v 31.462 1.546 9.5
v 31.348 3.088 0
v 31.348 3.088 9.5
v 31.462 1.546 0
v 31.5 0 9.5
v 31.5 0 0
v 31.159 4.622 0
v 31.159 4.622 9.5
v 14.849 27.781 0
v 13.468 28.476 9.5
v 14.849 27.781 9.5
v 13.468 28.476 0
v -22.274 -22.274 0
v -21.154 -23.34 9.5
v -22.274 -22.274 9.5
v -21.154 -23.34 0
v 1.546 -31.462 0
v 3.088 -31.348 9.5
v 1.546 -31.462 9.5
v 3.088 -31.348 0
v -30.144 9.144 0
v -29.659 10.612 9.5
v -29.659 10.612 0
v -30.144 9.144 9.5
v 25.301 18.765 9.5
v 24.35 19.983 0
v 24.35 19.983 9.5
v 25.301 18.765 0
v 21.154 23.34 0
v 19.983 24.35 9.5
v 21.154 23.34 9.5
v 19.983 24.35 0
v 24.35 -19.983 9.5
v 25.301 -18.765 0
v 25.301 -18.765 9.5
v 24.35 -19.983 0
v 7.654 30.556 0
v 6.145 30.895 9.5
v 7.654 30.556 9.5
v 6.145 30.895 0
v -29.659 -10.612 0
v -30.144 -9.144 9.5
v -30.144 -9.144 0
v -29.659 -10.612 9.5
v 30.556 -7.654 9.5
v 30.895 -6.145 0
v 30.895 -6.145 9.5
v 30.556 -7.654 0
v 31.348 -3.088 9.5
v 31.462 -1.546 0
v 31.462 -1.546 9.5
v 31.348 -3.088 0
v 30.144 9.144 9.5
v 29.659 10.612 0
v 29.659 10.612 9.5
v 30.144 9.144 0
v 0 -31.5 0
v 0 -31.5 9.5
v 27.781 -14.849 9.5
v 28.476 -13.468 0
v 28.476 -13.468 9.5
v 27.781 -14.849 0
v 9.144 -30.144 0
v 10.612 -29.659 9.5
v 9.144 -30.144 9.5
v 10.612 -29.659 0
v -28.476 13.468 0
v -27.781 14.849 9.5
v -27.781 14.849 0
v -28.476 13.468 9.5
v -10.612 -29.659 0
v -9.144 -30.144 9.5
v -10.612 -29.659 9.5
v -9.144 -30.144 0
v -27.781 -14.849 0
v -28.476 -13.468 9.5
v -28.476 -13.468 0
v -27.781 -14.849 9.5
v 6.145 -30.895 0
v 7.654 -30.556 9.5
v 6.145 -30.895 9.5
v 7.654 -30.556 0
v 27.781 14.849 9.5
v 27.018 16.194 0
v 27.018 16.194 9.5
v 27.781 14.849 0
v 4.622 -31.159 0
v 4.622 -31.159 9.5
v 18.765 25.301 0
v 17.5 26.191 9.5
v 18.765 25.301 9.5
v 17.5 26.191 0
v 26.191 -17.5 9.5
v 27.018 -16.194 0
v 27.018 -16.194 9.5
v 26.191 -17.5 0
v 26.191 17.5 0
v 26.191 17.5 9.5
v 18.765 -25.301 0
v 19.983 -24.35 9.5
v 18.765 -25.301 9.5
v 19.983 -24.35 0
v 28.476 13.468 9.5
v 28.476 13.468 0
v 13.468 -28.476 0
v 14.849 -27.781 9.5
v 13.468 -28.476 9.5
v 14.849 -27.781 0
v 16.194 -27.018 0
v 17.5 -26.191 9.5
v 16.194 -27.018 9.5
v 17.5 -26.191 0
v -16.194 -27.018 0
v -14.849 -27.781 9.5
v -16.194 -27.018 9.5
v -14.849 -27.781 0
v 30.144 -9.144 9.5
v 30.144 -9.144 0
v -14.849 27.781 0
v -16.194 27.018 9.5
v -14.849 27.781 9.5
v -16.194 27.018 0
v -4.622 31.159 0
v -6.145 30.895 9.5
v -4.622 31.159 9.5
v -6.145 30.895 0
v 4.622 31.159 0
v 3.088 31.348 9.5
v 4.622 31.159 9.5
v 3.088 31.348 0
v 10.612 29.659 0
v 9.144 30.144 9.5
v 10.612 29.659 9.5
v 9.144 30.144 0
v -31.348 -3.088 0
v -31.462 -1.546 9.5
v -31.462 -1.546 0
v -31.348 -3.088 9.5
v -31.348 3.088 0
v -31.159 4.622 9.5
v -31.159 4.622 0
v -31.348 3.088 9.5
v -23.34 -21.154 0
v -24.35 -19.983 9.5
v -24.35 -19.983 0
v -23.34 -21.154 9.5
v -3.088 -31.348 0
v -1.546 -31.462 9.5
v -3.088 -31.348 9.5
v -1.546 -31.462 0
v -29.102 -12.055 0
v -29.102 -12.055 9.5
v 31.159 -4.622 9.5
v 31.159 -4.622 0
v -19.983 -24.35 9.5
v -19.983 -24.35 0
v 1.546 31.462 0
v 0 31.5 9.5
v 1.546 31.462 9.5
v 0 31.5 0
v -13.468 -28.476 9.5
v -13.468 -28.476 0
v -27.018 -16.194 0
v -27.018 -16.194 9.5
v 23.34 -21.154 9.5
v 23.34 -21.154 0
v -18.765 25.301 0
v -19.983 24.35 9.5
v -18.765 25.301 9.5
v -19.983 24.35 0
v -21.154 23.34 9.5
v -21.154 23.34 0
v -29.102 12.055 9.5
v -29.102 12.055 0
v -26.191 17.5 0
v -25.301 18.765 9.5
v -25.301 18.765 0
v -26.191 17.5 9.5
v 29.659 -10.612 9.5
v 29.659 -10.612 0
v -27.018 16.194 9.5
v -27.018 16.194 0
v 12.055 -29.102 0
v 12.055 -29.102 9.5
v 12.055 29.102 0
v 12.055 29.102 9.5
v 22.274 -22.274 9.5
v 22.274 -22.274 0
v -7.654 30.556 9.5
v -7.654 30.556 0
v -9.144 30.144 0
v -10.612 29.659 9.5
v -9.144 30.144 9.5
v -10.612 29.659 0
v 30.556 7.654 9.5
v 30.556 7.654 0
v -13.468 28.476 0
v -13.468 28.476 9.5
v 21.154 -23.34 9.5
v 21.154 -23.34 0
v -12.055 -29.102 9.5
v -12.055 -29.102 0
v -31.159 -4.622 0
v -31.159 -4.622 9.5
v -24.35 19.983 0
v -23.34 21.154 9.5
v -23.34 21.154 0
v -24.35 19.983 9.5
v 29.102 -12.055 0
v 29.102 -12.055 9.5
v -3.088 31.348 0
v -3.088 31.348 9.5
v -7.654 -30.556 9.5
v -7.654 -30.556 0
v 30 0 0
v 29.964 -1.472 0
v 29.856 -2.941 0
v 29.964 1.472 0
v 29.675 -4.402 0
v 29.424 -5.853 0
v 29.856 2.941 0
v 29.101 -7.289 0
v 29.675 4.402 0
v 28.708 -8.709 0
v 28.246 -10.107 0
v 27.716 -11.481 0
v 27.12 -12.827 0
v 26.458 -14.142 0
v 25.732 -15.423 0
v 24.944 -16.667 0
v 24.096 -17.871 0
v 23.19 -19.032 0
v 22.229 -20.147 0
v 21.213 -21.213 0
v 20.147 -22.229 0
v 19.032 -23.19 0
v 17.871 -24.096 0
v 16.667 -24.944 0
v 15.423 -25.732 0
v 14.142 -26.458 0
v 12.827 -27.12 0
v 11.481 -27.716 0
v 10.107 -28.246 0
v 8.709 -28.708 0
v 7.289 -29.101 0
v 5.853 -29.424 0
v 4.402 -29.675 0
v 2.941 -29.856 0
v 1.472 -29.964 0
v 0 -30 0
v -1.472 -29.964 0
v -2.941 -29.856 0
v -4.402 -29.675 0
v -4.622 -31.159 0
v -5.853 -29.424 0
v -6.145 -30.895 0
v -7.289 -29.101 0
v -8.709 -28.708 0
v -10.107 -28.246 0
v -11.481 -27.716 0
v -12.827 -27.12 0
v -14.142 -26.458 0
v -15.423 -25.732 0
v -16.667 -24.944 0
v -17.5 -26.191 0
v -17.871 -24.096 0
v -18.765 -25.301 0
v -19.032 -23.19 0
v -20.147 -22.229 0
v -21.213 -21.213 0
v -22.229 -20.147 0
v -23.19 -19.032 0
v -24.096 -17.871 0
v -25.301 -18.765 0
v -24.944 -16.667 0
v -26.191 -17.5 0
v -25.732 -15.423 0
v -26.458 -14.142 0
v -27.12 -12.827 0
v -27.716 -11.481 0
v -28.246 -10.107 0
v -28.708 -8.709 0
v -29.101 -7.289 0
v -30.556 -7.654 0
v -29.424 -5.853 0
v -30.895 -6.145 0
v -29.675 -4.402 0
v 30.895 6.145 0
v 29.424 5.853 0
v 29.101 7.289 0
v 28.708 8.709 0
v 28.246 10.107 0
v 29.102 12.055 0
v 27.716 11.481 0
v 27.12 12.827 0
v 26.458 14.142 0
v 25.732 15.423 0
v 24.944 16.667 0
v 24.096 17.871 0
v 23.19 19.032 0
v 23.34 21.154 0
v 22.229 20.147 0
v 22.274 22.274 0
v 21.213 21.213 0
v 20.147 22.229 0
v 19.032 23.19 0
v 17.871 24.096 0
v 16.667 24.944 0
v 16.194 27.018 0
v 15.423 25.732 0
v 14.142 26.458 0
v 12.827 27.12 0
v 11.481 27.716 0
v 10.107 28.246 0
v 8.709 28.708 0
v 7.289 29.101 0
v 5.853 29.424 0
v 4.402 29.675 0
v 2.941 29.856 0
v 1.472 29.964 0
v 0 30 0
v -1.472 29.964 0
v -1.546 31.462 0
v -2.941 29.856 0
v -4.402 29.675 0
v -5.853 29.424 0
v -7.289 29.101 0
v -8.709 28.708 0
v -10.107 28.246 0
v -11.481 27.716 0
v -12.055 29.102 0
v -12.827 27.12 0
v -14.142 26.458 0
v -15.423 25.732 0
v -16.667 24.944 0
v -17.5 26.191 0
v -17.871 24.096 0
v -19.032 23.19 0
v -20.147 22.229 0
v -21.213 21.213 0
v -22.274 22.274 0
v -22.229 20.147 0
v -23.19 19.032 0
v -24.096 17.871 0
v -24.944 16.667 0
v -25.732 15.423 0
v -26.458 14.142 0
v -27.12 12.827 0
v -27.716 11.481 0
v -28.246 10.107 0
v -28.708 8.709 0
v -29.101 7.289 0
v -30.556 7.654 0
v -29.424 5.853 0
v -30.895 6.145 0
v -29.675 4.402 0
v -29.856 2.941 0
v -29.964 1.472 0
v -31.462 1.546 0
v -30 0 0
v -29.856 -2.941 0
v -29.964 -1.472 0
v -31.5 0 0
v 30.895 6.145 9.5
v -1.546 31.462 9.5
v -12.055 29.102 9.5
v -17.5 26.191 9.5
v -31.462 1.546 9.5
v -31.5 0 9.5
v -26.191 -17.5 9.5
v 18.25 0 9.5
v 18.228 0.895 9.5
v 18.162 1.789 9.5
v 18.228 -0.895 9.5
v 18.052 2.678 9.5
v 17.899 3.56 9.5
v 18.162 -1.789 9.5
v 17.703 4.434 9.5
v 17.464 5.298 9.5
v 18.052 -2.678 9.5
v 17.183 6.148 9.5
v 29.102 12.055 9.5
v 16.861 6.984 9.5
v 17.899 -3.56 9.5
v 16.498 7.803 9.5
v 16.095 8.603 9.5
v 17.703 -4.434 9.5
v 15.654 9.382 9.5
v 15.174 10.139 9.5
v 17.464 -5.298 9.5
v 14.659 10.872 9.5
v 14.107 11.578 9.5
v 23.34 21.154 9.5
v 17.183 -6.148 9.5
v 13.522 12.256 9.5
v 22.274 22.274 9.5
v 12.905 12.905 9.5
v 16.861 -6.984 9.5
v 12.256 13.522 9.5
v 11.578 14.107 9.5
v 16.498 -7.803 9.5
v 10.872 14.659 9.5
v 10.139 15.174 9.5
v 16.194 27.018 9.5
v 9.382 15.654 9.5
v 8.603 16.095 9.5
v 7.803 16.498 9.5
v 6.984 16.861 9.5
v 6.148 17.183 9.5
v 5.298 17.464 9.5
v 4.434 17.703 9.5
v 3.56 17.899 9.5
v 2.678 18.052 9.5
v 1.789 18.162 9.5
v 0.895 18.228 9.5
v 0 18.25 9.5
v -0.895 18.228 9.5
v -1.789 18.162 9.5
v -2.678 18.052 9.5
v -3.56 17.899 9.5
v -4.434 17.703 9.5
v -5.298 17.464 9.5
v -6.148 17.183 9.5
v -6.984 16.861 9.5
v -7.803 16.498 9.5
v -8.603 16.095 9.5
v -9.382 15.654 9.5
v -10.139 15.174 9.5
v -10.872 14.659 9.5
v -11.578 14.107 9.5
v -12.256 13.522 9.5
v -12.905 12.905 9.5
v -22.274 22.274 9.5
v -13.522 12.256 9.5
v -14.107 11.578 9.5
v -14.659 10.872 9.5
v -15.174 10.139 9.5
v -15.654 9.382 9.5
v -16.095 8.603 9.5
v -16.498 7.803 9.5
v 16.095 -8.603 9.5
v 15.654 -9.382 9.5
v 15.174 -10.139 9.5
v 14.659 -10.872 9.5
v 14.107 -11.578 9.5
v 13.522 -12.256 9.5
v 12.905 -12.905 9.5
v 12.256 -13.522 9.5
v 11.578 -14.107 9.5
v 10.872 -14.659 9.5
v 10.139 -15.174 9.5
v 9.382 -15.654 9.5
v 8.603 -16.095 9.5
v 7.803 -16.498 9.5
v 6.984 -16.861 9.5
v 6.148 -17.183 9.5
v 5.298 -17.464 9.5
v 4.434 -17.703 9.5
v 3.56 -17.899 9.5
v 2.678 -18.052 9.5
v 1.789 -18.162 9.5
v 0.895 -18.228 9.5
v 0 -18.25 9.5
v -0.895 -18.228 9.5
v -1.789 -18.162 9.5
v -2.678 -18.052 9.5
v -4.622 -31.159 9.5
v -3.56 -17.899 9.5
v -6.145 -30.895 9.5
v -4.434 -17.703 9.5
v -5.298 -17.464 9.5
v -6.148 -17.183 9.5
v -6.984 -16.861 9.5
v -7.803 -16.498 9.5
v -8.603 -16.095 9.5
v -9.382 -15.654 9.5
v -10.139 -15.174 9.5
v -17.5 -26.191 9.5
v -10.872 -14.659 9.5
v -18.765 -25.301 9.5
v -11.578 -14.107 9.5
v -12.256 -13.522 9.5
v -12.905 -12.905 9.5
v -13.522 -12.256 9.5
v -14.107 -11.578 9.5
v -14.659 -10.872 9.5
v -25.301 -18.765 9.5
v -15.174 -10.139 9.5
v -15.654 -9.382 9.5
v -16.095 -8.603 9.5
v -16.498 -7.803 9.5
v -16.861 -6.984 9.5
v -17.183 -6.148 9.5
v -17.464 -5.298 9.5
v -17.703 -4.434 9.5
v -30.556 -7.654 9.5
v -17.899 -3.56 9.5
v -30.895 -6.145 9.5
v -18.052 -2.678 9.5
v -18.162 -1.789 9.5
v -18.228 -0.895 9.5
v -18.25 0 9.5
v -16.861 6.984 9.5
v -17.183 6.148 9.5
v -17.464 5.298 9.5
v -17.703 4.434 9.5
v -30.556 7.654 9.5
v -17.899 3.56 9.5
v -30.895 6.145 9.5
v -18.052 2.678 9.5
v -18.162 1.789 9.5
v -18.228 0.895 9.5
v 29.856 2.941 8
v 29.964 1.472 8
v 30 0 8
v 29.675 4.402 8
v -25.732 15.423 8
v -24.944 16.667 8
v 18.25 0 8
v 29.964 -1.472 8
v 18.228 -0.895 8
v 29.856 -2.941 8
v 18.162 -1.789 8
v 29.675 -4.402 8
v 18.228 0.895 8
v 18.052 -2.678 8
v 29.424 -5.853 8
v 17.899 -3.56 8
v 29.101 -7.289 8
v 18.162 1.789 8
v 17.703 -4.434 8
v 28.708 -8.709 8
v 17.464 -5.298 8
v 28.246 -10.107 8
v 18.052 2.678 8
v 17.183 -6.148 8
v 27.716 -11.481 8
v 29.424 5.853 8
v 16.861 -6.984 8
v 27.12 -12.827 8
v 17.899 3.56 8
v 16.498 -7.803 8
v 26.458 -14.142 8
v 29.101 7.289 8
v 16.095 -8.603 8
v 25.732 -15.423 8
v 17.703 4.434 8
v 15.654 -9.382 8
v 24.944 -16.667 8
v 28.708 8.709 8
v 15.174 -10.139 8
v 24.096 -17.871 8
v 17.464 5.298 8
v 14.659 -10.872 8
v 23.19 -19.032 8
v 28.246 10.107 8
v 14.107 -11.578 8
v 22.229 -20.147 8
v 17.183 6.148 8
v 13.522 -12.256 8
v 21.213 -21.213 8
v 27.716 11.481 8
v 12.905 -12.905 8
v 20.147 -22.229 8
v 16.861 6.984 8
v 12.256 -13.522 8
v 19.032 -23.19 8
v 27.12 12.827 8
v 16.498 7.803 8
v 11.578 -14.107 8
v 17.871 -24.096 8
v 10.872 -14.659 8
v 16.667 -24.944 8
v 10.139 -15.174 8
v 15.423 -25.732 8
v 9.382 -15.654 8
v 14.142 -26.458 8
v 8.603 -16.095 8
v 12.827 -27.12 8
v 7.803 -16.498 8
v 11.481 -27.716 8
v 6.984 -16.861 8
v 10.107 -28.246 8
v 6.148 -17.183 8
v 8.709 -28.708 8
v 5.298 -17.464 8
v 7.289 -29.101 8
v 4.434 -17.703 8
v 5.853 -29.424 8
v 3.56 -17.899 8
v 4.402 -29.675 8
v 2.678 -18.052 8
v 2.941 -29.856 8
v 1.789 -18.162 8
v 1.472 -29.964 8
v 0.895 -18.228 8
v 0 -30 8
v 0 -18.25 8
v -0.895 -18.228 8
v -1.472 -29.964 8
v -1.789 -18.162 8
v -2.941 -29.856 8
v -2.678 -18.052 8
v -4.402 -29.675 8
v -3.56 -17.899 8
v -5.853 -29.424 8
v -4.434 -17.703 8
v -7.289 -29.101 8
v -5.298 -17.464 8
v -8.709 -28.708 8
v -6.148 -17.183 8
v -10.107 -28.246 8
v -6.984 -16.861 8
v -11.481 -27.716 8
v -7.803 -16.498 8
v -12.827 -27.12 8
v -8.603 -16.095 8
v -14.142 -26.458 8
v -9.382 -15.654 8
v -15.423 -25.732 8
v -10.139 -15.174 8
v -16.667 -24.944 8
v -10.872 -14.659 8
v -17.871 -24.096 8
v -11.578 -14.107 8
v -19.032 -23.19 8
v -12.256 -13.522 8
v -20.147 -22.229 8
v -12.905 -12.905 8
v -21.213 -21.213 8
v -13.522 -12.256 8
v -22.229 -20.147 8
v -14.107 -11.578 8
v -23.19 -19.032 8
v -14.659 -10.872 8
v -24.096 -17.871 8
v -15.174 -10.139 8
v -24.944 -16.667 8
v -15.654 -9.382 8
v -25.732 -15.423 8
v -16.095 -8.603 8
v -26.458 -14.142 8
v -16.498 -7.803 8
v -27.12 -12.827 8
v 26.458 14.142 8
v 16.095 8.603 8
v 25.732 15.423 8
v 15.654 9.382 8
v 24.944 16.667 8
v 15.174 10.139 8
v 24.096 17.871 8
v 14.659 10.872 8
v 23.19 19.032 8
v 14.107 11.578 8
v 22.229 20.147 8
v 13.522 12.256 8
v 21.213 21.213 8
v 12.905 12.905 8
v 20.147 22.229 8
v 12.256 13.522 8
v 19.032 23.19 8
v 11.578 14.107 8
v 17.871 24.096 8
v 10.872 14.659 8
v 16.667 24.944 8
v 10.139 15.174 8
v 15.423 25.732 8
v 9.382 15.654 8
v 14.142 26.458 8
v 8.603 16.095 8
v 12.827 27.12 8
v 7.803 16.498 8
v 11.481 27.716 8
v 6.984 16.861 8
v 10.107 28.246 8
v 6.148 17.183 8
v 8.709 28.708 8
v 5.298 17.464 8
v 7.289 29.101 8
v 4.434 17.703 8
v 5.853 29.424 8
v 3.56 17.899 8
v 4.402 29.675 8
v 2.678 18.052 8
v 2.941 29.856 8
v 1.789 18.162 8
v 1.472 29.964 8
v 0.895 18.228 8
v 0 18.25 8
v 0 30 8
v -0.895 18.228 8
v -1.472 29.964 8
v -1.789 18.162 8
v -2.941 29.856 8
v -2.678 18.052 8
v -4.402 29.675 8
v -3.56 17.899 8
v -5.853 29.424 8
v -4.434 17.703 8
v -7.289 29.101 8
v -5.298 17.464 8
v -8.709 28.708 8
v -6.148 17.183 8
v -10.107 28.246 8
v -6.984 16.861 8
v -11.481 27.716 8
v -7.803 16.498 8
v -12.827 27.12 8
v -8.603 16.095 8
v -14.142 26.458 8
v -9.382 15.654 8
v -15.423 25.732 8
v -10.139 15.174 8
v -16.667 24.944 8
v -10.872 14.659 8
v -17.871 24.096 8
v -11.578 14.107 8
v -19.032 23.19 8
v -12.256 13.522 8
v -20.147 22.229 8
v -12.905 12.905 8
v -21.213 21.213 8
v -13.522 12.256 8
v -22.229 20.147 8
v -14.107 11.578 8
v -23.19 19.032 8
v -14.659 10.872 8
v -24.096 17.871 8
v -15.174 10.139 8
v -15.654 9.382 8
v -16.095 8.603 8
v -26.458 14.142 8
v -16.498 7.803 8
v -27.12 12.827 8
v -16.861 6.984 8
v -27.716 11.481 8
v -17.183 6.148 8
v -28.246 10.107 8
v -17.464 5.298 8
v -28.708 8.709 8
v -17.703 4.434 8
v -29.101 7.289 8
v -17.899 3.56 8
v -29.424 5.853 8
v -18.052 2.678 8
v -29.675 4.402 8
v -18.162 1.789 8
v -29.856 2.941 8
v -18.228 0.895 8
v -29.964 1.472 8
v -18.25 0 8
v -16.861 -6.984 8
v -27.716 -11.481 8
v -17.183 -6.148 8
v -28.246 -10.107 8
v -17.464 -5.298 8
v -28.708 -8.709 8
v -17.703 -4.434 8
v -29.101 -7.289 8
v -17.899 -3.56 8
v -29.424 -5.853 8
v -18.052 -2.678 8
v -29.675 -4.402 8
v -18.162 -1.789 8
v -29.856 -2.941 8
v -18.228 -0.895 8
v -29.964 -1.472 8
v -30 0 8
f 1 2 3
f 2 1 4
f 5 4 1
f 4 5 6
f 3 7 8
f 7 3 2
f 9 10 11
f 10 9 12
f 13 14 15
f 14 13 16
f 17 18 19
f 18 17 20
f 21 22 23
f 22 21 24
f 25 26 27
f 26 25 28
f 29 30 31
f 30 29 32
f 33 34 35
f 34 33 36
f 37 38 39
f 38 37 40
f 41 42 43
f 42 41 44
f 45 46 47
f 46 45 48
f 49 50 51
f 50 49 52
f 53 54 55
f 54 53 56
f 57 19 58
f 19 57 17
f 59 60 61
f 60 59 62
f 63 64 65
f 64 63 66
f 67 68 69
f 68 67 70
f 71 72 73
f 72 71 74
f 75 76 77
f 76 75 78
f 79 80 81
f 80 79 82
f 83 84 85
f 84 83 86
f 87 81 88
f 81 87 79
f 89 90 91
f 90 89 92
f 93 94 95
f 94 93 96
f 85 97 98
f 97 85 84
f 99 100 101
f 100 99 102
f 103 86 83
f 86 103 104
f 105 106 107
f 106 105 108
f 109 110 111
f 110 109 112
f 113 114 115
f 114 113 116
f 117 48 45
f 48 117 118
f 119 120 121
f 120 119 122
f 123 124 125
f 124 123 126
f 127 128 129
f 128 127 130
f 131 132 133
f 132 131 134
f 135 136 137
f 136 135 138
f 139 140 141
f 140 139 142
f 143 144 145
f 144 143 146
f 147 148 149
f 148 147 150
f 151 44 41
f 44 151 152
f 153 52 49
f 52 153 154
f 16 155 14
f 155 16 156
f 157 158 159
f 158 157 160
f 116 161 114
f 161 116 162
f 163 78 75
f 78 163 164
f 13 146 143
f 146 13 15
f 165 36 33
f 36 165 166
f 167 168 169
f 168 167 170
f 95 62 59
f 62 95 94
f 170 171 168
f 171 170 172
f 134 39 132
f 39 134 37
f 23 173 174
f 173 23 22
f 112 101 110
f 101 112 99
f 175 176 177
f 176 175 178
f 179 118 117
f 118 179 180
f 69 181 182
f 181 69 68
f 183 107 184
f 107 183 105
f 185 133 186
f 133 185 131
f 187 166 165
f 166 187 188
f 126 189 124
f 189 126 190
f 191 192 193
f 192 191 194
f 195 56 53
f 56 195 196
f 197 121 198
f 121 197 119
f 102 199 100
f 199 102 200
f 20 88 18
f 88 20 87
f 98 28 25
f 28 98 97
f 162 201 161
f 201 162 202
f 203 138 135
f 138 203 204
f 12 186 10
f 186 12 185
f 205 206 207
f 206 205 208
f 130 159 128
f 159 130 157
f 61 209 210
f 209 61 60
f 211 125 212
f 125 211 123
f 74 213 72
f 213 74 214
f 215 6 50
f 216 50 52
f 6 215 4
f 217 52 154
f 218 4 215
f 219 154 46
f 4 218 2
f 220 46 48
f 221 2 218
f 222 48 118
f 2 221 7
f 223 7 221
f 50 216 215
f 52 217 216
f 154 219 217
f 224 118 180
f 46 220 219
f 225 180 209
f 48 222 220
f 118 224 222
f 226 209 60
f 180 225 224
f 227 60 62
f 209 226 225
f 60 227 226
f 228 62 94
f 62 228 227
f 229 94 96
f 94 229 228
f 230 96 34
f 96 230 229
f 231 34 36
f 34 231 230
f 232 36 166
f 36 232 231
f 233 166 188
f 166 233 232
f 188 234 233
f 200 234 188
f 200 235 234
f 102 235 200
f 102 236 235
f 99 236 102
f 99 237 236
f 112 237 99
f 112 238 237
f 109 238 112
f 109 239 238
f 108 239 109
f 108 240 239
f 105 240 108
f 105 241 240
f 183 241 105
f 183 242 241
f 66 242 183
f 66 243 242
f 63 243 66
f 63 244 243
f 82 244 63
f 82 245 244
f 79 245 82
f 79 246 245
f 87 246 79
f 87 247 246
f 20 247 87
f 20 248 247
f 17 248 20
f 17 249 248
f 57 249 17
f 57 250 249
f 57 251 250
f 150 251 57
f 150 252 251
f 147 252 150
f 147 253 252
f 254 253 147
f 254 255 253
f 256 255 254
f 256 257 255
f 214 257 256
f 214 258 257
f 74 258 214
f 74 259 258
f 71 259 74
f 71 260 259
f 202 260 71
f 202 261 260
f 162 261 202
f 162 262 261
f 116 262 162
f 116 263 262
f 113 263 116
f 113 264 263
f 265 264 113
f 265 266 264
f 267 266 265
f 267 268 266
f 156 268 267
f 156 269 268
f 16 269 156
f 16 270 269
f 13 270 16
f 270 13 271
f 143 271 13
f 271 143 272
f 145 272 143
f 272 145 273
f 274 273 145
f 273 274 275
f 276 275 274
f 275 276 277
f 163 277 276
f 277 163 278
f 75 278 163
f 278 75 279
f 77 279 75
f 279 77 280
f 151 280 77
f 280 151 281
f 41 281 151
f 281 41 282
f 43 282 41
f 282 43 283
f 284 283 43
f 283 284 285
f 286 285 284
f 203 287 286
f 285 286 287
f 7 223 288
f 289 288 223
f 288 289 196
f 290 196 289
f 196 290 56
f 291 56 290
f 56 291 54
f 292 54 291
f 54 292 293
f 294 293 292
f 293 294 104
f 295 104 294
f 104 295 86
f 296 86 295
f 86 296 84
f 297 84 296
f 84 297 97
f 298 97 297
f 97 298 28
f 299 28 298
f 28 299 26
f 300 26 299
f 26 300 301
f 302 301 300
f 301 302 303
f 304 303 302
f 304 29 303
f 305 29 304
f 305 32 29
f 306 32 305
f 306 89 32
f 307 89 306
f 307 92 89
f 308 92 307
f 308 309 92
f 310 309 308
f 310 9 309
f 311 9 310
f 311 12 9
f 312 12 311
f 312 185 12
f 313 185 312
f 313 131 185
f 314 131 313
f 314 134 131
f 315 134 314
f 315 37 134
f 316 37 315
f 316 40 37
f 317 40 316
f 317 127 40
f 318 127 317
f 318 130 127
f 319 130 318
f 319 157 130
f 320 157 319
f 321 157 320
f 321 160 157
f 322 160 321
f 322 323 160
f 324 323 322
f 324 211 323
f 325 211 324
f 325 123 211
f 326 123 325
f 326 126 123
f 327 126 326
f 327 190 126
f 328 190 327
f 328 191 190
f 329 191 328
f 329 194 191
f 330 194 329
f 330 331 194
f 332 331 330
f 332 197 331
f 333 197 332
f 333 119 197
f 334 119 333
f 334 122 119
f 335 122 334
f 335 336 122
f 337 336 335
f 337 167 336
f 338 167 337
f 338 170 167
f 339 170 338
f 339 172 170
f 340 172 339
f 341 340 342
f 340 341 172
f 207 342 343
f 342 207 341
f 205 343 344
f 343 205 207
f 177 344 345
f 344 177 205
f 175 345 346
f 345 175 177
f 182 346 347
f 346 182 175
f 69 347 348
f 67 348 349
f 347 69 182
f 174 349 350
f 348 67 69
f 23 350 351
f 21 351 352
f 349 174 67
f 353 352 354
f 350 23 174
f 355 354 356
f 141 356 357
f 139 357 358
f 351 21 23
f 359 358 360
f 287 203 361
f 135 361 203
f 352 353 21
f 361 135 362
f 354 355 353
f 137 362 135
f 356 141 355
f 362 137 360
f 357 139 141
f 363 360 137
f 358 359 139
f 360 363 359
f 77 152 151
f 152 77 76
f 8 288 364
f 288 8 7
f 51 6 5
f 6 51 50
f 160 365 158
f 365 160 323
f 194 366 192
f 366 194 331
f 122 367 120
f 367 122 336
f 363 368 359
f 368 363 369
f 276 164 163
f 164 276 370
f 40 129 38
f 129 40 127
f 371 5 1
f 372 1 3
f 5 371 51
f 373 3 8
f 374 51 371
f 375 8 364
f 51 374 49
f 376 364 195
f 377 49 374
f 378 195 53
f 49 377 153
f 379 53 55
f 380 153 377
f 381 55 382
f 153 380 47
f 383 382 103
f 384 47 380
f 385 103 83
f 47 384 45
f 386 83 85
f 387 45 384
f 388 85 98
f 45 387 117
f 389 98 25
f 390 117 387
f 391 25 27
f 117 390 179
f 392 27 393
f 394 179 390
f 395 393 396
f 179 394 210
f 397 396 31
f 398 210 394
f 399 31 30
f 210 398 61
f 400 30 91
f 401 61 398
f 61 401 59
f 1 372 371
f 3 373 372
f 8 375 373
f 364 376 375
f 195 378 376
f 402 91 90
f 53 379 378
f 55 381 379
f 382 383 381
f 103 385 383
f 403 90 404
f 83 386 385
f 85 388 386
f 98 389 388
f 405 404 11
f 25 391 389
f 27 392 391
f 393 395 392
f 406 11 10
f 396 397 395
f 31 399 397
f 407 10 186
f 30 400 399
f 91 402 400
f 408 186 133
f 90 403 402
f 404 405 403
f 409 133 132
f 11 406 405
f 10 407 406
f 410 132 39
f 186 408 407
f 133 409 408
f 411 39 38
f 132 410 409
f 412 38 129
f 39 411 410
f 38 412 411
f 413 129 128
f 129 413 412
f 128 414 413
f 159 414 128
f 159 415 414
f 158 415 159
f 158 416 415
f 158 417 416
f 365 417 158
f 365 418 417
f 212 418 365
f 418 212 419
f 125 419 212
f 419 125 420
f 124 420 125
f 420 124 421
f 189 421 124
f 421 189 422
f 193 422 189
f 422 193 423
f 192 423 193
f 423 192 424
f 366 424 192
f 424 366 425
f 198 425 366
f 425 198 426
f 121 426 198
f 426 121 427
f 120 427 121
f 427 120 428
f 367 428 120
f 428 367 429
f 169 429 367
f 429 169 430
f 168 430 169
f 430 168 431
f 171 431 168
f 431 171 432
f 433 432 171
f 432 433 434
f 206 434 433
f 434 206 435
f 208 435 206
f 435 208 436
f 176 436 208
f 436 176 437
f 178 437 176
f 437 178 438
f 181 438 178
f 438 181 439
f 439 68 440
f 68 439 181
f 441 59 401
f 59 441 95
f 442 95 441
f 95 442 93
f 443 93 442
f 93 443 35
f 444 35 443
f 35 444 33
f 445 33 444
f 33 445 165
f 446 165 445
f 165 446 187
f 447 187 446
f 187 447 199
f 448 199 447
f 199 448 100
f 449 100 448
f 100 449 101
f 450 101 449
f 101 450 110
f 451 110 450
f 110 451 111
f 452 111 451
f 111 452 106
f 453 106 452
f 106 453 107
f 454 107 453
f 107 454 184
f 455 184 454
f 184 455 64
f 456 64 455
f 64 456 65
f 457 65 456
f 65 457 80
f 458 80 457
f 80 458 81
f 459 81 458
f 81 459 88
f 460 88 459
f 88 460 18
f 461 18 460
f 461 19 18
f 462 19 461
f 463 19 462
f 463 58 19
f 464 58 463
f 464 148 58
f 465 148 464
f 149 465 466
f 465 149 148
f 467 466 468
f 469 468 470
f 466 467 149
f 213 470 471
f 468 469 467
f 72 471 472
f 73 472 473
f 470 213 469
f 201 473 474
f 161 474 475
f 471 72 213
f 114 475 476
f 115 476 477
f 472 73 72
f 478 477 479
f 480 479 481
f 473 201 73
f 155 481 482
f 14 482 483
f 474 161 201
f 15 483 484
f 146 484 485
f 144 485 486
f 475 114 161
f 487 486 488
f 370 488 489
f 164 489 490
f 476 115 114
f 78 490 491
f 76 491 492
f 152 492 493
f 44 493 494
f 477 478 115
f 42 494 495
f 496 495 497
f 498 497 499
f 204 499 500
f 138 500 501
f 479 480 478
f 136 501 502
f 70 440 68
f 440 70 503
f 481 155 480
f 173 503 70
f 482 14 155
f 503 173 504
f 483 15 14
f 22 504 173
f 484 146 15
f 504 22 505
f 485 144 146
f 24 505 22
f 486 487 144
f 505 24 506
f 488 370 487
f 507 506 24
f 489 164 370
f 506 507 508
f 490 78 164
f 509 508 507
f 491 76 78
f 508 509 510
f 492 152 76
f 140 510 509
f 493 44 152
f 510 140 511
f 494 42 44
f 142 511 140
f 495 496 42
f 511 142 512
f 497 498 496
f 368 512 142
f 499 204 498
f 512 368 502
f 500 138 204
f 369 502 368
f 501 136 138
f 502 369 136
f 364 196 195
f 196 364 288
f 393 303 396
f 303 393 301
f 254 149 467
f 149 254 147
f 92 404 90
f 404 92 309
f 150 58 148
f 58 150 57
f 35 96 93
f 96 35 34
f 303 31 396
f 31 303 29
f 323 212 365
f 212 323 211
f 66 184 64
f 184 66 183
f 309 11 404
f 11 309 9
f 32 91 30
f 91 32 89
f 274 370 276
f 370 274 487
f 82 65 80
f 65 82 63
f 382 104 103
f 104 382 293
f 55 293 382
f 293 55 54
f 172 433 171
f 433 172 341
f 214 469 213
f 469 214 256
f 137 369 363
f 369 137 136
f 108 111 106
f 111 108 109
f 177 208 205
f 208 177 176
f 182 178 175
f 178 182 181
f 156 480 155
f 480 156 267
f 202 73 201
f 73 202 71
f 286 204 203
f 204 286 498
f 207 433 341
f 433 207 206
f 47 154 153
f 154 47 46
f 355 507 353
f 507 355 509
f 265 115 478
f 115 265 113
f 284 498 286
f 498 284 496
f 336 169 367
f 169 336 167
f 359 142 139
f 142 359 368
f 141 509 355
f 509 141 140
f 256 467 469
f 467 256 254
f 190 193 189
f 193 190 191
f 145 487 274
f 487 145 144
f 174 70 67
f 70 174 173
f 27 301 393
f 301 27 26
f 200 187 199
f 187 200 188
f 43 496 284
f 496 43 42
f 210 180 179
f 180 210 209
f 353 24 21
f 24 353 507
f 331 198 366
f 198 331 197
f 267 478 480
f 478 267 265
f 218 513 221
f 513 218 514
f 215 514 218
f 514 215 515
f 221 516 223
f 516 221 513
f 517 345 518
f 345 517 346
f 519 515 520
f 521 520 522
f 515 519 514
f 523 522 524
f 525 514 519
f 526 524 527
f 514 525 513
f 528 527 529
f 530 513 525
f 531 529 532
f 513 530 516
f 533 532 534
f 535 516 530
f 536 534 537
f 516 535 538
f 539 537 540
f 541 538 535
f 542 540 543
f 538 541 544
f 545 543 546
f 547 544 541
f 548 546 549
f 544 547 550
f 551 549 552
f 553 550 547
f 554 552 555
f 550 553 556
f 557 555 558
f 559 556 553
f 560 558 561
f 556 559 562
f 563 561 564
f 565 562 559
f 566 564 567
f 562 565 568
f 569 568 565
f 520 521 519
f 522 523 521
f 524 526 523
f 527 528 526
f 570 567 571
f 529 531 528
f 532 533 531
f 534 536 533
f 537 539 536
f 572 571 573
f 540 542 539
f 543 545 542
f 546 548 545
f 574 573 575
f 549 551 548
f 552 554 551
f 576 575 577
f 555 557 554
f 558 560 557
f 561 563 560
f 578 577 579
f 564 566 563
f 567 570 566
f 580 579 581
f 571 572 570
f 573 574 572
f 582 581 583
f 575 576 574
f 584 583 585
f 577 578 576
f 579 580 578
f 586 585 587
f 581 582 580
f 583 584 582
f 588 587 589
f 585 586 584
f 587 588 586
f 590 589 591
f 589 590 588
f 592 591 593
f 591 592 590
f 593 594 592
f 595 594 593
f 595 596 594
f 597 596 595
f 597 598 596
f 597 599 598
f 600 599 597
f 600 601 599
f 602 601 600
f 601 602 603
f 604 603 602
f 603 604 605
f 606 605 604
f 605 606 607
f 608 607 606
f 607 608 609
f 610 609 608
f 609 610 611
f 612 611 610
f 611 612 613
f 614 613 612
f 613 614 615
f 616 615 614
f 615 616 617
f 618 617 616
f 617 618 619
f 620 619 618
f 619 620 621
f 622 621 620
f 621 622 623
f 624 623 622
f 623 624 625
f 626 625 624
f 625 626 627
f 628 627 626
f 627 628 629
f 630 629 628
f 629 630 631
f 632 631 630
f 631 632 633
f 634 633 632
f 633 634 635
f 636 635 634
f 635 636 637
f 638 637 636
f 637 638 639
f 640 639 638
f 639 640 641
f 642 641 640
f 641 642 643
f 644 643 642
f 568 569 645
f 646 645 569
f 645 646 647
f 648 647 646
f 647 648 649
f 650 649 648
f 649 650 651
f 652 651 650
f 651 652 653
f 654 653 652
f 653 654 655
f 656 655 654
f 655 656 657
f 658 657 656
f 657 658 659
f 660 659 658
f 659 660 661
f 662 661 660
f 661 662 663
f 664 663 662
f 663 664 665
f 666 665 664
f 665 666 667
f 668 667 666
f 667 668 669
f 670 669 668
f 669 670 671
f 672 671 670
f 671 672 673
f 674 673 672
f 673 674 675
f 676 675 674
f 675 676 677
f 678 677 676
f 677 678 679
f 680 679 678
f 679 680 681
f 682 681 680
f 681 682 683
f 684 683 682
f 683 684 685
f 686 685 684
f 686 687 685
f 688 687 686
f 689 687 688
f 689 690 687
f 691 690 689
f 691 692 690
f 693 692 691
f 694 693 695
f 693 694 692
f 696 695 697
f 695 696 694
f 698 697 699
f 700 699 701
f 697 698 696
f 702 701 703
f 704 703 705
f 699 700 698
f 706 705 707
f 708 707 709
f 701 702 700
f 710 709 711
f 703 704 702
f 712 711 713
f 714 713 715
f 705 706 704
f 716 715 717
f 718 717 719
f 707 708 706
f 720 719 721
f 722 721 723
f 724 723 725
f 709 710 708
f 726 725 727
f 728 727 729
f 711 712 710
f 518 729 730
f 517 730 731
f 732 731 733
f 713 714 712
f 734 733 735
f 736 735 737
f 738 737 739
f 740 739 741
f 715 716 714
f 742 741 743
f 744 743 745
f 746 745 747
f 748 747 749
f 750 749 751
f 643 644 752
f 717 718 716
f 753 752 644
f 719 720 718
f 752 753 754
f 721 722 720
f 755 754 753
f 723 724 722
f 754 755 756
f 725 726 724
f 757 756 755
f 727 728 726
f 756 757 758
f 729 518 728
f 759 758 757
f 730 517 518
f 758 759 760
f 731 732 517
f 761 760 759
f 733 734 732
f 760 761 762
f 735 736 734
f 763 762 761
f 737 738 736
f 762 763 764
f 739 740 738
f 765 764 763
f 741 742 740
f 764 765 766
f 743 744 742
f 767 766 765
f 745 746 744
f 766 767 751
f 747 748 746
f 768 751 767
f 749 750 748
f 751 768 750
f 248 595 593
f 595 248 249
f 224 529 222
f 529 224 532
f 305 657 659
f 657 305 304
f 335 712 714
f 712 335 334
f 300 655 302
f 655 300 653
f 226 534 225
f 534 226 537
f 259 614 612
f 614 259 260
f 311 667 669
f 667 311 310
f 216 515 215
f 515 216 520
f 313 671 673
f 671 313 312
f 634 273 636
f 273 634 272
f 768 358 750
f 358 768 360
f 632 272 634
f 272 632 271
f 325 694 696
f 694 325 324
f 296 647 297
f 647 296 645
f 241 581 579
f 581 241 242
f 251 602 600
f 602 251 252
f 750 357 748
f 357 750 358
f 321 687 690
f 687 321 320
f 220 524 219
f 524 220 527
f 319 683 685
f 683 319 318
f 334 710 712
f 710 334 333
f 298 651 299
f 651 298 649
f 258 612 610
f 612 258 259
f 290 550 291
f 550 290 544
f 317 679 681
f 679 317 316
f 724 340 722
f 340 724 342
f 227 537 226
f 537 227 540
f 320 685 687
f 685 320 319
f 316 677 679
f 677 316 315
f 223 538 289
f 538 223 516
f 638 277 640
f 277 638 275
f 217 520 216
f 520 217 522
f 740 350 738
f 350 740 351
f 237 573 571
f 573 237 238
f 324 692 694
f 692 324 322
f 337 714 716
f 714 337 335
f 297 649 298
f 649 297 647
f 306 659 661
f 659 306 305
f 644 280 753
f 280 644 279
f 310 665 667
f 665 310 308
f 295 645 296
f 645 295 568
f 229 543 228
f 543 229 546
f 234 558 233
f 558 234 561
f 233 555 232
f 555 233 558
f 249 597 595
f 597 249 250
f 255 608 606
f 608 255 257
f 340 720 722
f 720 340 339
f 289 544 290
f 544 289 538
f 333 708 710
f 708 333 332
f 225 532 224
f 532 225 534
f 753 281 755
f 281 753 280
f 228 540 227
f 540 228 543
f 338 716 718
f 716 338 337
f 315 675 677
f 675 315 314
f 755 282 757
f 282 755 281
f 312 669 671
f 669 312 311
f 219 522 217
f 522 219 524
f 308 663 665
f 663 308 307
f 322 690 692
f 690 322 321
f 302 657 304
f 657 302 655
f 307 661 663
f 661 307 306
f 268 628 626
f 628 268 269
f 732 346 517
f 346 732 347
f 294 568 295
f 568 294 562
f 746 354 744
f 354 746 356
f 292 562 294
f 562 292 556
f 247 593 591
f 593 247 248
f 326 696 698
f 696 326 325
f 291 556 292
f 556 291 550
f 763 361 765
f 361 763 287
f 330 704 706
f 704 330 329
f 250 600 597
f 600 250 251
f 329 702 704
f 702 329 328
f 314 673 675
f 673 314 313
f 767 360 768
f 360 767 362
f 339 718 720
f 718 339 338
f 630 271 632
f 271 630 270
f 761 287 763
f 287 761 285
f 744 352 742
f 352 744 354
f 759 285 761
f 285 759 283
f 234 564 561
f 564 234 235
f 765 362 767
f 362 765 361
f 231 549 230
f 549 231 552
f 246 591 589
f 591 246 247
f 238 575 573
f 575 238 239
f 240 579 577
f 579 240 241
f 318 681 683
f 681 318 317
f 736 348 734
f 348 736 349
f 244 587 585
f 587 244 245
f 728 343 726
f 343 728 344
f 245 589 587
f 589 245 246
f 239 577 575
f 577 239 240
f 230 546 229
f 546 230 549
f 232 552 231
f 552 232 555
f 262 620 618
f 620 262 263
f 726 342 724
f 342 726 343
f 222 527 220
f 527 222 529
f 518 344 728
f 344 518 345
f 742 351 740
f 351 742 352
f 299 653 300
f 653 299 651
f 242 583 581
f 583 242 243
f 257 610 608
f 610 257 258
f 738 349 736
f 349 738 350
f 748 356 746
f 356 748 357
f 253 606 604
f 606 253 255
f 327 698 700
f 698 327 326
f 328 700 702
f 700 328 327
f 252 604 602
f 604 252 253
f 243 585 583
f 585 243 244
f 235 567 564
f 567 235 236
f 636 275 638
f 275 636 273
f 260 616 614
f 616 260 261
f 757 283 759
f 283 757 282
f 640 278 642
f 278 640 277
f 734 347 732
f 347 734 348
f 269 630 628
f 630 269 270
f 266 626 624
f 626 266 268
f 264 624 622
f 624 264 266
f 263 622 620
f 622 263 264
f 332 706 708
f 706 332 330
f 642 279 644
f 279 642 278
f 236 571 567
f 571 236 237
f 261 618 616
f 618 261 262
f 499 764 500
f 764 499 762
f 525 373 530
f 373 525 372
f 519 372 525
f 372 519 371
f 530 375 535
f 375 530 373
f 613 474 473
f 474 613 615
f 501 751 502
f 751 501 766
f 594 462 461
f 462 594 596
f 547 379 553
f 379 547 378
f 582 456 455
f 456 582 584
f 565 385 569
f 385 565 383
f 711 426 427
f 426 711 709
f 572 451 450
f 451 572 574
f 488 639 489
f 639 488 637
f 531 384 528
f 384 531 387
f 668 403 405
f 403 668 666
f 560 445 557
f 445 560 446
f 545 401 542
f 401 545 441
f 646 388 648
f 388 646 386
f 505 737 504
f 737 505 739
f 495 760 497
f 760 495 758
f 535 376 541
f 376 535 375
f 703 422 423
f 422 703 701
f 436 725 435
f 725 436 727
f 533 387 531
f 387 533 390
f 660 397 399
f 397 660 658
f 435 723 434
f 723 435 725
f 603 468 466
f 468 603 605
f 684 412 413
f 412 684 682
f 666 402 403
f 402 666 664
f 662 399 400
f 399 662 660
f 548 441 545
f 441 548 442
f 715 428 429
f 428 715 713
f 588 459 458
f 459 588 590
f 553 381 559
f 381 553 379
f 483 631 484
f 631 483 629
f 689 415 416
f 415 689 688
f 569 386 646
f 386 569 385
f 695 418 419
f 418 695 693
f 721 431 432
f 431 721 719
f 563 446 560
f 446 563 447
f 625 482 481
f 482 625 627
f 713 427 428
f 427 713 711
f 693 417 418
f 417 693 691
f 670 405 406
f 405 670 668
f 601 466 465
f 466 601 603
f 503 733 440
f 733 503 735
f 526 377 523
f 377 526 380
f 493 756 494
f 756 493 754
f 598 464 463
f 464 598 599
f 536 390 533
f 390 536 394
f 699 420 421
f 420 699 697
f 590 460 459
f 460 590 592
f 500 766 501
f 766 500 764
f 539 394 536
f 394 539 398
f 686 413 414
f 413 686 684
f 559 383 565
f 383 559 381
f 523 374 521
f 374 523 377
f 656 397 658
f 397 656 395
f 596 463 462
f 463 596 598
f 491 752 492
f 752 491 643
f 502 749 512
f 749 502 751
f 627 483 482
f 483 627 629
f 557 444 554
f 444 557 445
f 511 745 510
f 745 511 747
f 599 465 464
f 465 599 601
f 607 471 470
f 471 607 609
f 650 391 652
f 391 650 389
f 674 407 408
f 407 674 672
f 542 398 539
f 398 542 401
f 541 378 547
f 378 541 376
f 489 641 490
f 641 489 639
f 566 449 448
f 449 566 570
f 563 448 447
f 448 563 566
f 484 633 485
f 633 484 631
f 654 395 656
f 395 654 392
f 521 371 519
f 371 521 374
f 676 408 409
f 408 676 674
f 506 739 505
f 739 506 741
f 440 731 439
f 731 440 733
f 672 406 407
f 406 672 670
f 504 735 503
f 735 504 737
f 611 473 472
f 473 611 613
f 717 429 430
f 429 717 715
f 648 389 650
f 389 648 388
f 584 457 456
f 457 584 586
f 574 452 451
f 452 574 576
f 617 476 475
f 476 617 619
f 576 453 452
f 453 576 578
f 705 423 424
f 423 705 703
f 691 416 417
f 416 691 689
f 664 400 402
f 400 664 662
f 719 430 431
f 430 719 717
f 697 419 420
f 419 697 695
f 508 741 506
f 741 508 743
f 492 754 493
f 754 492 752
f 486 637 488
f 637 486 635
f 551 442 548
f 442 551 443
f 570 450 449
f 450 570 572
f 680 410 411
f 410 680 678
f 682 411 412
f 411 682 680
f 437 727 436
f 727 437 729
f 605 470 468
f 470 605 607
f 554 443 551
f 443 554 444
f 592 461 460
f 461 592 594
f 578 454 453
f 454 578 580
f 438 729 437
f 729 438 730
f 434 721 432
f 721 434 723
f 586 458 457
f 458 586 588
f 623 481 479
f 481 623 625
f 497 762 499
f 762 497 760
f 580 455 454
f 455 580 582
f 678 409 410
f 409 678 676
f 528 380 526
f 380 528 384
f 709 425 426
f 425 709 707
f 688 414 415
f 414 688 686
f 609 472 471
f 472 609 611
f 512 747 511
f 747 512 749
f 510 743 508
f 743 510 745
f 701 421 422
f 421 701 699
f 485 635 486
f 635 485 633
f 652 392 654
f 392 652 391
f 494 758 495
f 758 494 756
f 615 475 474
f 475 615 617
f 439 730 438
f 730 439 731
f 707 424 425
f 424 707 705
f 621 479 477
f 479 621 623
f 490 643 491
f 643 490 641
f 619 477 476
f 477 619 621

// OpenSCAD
LID_RADIUS = 60/2; // INTERNAL
LID_HEIGHT = 8; // INTERNAL
LID_THICKNESS = 1.5;

NETPOT_RADIUS = 36.5/2;

module main() {
  difference() {
    cylinder(LID_HEIGHT+LID_THICKNESS, r = LID_RADIUS+LID_THICKNESS, $fn=128);
    cylinder(LID_HEIGHT, r = LID_RADIUS, $fn=128);
    cylinder(LID_HEIGHT+LID_THICKNESS, r = NETPOT_RADIUS, $fn=128);
  };
}

main();
